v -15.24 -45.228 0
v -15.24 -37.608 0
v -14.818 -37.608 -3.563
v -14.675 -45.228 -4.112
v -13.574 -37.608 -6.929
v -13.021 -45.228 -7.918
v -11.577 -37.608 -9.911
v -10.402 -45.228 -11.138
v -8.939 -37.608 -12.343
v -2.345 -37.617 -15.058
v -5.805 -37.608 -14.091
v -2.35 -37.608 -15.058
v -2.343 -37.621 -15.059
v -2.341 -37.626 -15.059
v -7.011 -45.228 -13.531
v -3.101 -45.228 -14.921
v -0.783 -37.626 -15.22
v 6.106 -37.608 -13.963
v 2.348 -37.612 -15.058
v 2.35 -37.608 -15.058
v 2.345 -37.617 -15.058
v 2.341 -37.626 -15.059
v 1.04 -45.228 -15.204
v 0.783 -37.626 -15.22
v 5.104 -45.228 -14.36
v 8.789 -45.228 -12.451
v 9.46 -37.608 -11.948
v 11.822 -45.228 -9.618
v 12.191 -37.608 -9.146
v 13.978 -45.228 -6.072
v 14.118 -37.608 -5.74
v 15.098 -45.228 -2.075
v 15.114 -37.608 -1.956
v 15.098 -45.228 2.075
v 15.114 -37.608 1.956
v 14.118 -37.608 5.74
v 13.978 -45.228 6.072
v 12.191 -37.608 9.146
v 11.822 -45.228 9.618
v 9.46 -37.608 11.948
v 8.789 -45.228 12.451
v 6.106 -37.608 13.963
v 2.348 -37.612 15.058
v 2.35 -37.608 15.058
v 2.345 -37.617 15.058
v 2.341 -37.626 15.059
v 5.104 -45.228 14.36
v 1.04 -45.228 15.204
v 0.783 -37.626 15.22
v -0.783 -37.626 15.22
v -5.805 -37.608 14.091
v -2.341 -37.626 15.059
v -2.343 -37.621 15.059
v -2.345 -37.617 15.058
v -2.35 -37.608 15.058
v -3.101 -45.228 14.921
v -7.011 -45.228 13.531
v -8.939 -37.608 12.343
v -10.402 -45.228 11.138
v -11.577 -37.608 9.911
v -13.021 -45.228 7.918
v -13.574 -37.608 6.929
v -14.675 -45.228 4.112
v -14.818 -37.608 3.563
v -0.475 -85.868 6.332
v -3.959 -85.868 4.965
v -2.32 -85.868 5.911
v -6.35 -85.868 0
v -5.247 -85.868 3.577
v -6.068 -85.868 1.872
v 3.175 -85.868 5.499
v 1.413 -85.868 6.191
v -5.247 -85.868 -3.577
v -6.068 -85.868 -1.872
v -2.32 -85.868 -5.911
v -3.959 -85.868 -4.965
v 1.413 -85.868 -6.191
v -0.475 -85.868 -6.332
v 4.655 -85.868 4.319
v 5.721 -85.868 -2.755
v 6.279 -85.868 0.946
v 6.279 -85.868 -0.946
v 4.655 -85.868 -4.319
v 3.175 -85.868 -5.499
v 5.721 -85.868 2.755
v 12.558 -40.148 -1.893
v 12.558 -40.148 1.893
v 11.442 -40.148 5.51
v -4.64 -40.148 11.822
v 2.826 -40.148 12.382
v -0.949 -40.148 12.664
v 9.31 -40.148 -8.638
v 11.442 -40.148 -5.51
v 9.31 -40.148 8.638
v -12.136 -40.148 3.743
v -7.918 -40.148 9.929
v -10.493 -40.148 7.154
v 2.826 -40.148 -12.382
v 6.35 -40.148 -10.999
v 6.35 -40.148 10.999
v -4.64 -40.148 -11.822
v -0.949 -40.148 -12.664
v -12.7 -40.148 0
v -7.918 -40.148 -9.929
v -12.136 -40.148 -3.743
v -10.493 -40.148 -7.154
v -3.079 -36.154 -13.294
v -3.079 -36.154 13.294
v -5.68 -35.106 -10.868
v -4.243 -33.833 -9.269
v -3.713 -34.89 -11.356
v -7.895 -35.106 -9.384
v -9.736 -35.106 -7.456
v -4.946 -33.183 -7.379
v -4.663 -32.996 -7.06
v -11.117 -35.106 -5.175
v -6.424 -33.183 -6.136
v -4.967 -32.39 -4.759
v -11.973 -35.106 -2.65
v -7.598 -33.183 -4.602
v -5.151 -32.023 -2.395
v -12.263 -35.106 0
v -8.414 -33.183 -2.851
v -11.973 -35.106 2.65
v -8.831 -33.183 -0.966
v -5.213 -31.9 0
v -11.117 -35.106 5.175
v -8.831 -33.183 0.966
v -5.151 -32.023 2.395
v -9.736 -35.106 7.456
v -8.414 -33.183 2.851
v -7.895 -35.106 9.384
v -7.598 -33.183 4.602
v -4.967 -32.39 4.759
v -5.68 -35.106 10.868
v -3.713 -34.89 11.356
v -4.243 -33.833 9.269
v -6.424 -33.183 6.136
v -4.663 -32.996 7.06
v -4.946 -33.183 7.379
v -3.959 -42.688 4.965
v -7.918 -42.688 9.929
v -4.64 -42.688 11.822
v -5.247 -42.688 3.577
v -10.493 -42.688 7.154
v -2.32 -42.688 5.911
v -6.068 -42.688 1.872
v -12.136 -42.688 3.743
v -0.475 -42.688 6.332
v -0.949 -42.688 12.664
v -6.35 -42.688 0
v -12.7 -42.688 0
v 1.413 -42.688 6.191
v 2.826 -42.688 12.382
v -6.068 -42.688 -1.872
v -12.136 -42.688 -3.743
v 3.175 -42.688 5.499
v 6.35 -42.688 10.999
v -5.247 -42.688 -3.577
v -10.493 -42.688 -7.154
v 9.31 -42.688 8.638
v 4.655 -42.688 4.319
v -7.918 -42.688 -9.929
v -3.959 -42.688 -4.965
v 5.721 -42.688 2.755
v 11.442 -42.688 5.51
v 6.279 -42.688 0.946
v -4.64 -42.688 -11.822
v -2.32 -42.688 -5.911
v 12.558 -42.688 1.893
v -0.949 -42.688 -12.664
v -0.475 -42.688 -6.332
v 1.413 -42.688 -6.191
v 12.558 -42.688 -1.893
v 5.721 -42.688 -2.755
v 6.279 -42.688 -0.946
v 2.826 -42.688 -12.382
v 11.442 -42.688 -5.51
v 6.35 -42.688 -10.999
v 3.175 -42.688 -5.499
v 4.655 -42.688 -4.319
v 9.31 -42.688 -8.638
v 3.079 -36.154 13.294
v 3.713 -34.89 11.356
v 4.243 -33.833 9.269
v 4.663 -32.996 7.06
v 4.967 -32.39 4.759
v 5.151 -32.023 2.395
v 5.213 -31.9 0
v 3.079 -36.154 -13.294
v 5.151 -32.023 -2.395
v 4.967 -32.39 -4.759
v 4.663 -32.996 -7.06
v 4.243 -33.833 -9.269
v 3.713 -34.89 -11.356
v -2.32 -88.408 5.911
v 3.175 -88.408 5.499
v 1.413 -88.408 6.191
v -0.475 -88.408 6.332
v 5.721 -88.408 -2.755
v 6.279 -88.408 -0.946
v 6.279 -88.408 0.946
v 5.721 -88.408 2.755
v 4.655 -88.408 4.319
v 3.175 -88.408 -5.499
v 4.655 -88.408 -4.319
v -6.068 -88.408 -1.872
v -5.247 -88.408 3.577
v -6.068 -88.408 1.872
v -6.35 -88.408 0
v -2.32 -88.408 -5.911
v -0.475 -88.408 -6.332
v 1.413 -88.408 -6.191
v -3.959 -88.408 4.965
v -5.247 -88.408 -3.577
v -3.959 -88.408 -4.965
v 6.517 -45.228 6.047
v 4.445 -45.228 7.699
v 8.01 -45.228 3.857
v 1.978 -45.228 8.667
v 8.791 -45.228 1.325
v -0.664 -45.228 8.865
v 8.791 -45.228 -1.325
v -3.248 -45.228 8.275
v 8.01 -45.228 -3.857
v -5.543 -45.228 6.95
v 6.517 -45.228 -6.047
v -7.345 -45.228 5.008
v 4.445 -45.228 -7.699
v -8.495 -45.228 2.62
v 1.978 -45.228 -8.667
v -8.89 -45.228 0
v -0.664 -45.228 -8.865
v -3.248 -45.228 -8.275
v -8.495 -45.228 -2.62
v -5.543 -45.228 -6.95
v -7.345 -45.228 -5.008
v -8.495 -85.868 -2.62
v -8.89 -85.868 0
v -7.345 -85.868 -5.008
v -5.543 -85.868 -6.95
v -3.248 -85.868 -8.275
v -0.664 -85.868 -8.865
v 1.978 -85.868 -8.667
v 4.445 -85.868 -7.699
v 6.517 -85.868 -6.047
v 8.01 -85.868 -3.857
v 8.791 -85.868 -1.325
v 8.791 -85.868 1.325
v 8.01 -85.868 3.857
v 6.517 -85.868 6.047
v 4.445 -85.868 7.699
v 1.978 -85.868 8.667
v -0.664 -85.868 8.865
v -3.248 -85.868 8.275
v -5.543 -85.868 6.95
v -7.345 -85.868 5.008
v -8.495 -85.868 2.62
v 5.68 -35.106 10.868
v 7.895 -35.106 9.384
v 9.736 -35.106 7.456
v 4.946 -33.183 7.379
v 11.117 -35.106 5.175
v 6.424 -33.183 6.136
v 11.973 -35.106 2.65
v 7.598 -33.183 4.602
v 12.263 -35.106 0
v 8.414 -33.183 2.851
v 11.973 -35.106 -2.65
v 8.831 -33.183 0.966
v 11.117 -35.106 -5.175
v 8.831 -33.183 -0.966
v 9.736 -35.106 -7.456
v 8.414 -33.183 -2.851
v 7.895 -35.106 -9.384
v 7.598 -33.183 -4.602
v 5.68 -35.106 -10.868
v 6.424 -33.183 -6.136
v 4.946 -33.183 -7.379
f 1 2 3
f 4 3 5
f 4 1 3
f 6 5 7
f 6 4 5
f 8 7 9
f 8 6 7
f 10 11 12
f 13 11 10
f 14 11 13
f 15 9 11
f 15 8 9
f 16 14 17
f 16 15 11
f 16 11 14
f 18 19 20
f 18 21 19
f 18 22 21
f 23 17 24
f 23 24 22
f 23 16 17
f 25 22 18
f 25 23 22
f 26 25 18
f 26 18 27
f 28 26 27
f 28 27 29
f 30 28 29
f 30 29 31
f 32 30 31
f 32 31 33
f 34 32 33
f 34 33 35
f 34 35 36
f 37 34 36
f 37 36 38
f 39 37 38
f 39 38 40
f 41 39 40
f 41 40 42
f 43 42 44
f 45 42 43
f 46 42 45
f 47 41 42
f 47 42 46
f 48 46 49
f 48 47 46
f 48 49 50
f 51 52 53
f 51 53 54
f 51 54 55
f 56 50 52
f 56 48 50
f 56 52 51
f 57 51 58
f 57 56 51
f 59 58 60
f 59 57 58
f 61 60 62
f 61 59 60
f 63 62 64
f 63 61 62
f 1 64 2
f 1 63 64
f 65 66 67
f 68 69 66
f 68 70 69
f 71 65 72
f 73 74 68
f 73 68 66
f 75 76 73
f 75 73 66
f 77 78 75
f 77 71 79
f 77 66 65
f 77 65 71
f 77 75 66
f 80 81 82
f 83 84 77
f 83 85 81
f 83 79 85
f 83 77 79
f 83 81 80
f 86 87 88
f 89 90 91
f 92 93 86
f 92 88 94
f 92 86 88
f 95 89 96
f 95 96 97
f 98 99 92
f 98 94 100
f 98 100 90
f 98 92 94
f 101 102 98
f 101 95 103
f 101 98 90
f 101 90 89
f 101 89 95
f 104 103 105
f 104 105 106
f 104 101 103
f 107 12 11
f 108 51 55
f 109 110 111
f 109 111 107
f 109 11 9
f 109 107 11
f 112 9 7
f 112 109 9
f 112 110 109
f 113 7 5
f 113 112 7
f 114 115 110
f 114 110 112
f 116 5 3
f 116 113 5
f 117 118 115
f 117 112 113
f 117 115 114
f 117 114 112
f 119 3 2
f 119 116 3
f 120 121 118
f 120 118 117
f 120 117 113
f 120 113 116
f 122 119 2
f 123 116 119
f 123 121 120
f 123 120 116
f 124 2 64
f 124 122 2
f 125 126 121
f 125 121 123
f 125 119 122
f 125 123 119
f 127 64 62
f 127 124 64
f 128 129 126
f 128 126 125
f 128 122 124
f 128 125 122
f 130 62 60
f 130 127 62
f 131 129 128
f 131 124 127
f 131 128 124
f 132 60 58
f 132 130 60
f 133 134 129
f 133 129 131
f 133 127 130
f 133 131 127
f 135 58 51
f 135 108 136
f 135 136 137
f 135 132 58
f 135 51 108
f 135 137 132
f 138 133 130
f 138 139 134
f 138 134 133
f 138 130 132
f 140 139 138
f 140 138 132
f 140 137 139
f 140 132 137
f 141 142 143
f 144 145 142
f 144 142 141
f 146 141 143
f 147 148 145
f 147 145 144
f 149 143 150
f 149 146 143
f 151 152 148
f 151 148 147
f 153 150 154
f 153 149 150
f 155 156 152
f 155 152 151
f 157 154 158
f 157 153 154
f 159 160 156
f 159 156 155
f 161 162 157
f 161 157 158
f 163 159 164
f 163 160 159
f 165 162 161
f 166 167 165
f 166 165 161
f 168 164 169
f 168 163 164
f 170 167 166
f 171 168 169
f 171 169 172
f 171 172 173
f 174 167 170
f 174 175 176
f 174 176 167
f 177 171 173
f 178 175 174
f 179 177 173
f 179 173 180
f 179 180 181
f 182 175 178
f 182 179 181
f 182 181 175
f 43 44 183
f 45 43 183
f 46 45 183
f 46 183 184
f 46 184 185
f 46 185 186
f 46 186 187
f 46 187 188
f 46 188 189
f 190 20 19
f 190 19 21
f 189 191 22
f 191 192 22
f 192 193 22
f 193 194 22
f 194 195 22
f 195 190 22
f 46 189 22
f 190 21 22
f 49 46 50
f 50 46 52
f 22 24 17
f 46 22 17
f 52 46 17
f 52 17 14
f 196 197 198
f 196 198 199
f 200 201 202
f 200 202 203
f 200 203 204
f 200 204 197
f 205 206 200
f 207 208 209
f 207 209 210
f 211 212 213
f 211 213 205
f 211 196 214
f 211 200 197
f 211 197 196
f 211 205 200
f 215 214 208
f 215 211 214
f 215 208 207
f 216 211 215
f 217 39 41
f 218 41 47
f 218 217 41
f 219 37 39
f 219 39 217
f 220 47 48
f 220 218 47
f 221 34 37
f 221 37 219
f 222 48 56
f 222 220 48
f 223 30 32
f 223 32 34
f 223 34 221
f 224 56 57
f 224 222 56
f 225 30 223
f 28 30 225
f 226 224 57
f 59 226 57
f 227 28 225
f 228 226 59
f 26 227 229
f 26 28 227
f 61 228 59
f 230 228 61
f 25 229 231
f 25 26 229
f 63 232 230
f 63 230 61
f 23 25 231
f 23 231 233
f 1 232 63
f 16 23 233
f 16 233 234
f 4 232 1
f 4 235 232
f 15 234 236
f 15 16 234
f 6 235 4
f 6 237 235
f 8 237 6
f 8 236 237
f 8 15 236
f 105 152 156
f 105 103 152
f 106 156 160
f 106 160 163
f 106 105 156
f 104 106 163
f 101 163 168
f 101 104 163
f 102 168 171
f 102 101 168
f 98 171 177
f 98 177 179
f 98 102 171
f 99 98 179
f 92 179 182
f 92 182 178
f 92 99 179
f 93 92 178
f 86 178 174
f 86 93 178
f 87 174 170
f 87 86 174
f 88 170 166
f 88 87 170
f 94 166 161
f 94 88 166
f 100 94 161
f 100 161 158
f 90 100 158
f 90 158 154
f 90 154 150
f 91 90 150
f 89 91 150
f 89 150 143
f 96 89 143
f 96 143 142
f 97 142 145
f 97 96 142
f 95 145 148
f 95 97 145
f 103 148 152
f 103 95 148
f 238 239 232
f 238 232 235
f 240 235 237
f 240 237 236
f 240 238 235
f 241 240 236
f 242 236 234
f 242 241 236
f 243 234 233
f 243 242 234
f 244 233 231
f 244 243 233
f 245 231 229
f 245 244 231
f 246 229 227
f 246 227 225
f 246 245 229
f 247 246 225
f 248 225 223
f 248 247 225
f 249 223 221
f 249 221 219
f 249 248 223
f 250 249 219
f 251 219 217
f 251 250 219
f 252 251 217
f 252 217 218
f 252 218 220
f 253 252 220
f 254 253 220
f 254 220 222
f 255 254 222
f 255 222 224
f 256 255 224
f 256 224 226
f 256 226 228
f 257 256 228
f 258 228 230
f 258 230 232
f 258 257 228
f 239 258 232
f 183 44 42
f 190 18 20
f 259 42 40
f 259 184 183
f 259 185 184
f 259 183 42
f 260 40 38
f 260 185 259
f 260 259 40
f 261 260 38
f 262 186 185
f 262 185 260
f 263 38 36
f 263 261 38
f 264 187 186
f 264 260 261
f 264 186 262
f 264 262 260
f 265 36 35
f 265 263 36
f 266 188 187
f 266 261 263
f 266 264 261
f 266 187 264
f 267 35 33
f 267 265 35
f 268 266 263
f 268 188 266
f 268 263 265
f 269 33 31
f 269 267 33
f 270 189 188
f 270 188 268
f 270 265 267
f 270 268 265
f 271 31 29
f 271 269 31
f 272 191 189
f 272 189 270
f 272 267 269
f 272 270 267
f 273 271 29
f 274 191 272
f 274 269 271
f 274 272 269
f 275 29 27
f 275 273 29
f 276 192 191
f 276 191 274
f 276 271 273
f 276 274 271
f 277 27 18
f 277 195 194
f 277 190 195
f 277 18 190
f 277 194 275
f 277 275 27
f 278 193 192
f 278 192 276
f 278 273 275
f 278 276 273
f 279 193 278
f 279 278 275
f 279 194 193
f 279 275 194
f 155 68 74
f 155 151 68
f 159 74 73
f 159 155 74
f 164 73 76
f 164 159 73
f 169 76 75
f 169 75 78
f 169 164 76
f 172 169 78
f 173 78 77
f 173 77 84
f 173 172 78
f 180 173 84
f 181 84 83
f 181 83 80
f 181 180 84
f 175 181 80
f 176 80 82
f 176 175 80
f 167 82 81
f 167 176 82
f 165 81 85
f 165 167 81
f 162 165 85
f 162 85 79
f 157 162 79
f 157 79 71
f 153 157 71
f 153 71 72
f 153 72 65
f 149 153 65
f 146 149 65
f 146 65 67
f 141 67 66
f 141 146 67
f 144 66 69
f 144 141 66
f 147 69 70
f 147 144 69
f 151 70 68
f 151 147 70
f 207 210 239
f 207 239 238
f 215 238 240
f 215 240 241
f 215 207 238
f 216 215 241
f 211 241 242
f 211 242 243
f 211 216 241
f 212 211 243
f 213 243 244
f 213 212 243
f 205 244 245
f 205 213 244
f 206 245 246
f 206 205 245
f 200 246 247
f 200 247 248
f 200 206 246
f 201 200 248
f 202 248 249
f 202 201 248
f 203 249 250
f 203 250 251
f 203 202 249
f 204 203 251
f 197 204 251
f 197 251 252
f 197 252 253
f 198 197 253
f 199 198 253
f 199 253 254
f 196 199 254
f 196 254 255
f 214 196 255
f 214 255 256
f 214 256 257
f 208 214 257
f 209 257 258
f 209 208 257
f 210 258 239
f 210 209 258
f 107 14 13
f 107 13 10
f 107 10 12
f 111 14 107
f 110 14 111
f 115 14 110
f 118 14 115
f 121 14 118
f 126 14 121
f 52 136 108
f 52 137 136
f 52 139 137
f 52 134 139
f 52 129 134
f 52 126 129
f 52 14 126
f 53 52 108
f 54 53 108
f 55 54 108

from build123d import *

# Parameters (mm, degrees)
CHAMFER1_SIZE           = 2.54
DOME1_FACE_RADIUS       = 15.24
DOME1_HEIGHT            = 6.35
CUT_EXTRUDE5_DEPTH      = 16.24
CUT_EXTRUDE5_DEPTH_BACK = 16.24


with BuildPart() as part:
    # Sketch2 → Revolve-Thin2 (revolve)
    with BuildSketch(Plane.XY):
        Polygon((0, -85.867755946), (-6.35, -85.867755946), (-6.35, -42.687755946), (-12.7, -42.687755946), (-12.7, -40.147755946), (0, -40.147755946), (0, -37.607755946), (-15.24, -37.607755946), (-15.24, -45.227755946), (-8.89, -45.227755946), (-8.89, -88.407755946), (0, -88.407755946), align=None)
    revolve(axis=Axis((0, -25.732100586, 0), (0, -1, 0)))

    # Chamfer1
    chamfer1_edges = [part.edges().sort_by_distance(p)[0] for p in [
        (8.89, -88.407755946, 0),
    ]]
    chamfer(chamfer1_edges, length=CHAMFER1_SIZE)

    # Dome1: a dome of height H over a round flat face of radius A is a cap of a sphere of radius (A * A + H * H) / (2 * H)
    dome1_r = (DOME1_FACE_RADIUS * DOME1_FACE_RADIUS + DOME1_HEIGHT * DOME1_HEIGHT) / (2 * DOME1_HEIGHT)
    dome1_base = Plane((0, -37.607755946, 0), z_dir=(0, 1, 0))
    with Locations(dome1_base.offset(DOME1_HEIGHT - dome1_r)):
        dome1_ball = Sphere(dome1_r, mode=Mode.PRIVATE)
    add(split(dome1_ball, bisect_by=dome1_base, keep=Keep.TOP, mode=Mode.PRIVATE))

    # Sketch15 → Cut-Extrude5 (cut, two sides)
    with BuildSketch(Plane.XY) as cut_extrude5_sk:
        Polygon((63.582364053, 84.47121169), (5.21254128, -31.900338505), (2.340727282, -37.625856093), (-2.340727282, -37.625856093), (-5.21254128, -31.900338505), (-63.582364053, 84.47121169), (-63.582364053, 344.850733967), (63.582364053, 344.850733967), align=None)
    extrude(amount=CUT_EXTRUDE5_DEPTH, mode=Mode.SUBTRACT)
    extrude(cut_extrude5_sk.sketch, amount=-CUT_EXTRUDE5_DEPTH_BACK, mode=Mode.SUBTRACT)


solid = part.part
